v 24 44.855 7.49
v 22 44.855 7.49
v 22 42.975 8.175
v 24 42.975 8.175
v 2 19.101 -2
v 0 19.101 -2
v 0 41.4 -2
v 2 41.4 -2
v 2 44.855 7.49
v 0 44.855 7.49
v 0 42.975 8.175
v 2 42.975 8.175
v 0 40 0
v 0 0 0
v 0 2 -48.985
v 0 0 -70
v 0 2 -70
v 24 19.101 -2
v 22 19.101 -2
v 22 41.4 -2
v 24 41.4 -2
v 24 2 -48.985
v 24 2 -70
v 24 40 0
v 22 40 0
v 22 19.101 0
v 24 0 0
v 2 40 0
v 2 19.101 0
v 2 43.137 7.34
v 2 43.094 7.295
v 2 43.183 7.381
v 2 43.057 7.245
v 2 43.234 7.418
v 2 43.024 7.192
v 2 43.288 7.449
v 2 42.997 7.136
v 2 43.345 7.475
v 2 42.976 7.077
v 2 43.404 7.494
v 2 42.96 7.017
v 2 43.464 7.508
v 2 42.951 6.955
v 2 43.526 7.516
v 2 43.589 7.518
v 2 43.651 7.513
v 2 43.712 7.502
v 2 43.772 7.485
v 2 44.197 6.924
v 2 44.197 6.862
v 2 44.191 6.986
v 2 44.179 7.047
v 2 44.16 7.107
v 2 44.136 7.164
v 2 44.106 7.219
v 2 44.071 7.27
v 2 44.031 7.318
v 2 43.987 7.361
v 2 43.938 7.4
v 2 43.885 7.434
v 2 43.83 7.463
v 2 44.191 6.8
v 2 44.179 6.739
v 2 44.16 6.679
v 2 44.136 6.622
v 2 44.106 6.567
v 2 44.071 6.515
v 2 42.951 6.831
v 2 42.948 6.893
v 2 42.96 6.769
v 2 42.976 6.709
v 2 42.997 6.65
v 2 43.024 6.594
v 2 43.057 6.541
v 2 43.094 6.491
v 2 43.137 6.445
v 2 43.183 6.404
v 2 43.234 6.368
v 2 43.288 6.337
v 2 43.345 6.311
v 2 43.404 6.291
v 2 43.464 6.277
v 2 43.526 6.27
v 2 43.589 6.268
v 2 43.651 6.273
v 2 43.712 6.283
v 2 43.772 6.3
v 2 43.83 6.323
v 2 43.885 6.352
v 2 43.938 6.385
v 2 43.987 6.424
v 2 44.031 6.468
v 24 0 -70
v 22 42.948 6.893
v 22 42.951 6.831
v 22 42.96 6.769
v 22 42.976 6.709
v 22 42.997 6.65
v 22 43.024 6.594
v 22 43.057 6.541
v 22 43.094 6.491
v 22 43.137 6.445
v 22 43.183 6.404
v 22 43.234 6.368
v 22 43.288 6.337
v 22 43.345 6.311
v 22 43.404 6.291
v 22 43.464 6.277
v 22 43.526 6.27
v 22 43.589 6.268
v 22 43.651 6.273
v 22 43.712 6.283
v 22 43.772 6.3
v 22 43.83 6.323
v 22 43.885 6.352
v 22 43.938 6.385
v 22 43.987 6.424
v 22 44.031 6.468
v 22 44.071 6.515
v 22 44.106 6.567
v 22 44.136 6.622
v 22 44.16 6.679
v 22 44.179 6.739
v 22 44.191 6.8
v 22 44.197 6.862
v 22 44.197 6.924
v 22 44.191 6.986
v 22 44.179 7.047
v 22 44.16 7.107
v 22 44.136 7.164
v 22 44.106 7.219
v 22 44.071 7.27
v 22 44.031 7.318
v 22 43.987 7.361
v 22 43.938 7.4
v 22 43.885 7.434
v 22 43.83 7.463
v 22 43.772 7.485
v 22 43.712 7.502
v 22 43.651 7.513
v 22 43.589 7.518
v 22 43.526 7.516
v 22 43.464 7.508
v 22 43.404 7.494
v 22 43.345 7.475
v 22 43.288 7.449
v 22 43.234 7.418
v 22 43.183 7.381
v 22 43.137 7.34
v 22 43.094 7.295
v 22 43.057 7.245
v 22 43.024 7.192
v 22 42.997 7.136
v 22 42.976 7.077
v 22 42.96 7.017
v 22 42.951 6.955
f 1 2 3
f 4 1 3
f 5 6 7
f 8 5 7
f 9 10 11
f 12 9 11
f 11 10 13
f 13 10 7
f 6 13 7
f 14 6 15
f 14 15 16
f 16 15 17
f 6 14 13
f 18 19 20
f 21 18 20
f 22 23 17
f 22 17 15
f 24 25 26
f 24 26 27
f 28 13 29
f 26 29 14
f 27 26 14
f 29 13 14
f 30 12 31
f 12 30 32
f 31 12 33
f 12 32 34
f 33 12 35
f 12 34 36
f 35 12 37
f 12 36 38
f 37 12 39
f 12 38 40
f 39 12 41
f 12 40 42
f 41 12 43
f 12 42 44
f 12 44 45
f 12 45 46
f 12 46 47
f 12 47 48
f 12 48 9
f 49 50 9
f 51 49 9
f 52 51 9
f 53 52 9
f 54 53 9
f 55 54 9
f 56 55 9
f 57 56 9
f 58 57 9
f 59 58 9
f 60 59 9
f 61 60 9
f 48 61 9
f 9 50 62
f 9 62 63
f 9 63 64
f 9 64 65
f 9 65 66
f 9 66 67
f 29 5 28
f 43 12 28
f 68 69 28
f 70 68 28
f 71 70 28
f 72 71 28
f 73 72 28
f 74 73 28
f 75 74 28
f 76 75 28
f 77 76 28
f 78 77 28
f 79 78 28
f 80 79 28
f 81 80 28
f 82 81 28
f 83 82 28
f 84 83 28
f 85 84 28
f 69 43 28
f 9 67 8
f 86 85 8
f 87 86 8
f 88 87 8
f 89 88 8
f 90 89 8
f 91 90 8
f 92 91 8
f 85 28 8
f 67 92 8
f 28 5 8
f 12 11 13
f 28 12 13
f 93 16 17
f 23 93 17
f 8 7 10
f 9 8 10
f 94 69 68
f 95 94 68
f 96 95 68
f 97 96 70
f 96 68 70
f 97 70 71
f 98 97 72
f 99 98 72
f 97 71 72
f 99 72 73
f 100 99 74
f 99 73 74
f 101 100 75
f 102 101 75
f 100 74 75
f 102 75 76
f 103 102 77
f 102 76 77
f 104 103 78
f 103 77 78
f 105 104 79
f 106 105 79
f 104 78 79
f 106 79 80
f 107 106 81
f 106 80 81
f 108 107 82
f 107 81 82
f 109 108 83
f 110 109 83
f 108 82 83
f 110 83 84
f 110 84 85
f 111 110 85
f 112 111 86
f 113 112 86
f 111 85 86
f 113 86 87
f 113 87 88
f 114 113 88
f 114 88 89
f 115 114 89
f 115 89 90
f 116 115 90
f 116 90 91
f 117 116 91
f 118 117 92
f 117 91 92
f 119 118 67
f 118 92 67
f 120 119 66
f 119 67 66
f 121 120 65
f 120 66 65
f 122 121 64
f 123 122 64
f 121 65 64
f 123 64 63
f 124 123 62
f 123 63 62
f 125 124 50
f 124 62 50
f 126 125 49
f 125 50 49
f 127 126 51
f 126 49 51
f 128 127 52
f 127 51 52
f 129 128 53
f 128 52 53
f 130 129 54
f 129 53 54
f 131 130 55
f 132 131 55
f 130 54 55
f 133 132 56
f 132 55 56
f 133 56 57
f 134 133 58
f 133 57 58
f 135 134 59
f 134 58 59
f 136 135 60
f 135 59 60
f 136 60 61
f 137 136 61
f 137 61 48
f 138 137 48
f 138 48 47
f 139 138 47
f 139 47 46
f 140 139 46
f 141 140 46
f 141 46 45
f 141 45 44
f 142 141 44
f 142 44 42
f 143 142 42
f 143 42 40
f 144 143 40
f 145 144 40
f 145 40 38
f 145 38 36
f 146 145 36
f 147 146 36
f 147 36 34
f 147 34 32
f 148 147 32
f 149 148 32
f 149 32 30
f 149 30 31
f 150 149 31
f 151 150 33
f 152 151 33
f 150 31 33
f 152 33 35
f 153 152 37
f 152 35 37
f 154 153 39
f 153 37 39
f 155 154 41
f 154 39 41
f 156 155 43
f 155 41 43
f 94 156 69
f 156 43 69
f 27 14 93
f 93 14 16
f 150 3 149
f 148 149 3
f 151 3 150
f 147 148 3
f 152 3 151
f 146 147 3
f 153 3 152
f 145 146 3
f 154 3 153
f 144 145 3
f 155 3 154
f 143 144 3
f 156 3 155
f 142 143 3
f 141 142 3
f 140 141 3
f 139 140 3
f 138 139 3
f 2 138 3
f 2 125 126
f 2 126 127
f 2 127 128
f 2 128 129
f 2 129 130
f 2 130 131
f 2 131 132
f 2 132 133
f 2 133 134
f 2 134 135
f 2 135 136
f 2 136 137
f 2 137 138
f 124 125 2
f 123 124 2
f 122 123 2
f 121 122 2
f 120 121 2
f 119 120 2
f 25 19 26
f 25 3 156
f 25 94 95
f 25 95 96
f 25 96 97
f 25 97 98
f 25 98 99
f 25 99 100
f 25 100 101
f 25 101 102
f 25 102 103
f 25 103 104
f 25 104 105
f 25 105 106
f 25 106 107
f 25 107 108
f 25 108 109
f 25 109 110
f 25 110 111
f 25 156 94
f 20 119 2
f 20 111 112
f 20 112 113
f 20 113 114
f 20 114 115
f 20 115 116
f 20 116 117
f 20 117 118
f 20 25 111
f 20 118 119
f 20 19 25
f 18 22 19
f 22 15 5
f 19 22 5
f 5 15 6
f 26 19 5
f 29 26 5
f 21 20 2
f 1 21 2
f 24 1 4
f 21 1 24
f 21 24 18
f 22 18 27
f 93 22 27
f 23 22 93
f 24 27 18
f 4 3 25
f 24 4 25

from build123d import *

# Parameters (mm, degrees)
BOSS_EXTRUDE1_DEPTH = 24
SKETCH5_W           = 20
SKETCH5_H           = 30.196049995
CUT_EXTRUDE1_DEPTH  = 20
SKETCH6_R           = 0.625
BOSS_EXTRUDE2_DEPTH = 20


with BuildPart() as part:
    # Sketch2 → Boss-Extrude1 (new body)
    with BuildSketch(Plane(origin=(0, 0, 0), x_dir=(0, 0, -1), z_dir=(1, 0, 0))):
        Polygon((0, 0), (70, 0), (70, 2), (48.984631039, 2), (2, 19.101007166), (2, 41.400415076), (-7.490496191, 44.854673198), (-8.174536478, 42.975287957), (0, 40), align=None)
    extrude(amount=BOSS_EXTRUDE1_DEPTH)

    # Sketch5 → Cut-Extrude1 (cut)
    with BuildSketch(Plane(origin=(0, 0, -2), x_dir=(-1, 0, 0), z_dir=(0, 0, -1))):
        with Locations((-12, 34.199032164)):
            Rectangle(SKETCH5_W, SKETCH5_H)
    extrude(amount=-CUT_EXTRUDE1_DEPTH, mode=Mode.SUBTRACT)

    # Sketch6 → Boss-Extrude2 (add)
    with BuildSketch(Plane(origin=(2, 0, 0), x_dir=(0, 0, -1), z_dir=(1, 0, 0))):
        with Locations(Location((-6.892823714, 43.572960434, 0), (0, 0, 270))):
            Circle(SKETCH6_R)
    extrude(amount=BOSS_EXTRUDE2_DEPTH)


solid = part.part
